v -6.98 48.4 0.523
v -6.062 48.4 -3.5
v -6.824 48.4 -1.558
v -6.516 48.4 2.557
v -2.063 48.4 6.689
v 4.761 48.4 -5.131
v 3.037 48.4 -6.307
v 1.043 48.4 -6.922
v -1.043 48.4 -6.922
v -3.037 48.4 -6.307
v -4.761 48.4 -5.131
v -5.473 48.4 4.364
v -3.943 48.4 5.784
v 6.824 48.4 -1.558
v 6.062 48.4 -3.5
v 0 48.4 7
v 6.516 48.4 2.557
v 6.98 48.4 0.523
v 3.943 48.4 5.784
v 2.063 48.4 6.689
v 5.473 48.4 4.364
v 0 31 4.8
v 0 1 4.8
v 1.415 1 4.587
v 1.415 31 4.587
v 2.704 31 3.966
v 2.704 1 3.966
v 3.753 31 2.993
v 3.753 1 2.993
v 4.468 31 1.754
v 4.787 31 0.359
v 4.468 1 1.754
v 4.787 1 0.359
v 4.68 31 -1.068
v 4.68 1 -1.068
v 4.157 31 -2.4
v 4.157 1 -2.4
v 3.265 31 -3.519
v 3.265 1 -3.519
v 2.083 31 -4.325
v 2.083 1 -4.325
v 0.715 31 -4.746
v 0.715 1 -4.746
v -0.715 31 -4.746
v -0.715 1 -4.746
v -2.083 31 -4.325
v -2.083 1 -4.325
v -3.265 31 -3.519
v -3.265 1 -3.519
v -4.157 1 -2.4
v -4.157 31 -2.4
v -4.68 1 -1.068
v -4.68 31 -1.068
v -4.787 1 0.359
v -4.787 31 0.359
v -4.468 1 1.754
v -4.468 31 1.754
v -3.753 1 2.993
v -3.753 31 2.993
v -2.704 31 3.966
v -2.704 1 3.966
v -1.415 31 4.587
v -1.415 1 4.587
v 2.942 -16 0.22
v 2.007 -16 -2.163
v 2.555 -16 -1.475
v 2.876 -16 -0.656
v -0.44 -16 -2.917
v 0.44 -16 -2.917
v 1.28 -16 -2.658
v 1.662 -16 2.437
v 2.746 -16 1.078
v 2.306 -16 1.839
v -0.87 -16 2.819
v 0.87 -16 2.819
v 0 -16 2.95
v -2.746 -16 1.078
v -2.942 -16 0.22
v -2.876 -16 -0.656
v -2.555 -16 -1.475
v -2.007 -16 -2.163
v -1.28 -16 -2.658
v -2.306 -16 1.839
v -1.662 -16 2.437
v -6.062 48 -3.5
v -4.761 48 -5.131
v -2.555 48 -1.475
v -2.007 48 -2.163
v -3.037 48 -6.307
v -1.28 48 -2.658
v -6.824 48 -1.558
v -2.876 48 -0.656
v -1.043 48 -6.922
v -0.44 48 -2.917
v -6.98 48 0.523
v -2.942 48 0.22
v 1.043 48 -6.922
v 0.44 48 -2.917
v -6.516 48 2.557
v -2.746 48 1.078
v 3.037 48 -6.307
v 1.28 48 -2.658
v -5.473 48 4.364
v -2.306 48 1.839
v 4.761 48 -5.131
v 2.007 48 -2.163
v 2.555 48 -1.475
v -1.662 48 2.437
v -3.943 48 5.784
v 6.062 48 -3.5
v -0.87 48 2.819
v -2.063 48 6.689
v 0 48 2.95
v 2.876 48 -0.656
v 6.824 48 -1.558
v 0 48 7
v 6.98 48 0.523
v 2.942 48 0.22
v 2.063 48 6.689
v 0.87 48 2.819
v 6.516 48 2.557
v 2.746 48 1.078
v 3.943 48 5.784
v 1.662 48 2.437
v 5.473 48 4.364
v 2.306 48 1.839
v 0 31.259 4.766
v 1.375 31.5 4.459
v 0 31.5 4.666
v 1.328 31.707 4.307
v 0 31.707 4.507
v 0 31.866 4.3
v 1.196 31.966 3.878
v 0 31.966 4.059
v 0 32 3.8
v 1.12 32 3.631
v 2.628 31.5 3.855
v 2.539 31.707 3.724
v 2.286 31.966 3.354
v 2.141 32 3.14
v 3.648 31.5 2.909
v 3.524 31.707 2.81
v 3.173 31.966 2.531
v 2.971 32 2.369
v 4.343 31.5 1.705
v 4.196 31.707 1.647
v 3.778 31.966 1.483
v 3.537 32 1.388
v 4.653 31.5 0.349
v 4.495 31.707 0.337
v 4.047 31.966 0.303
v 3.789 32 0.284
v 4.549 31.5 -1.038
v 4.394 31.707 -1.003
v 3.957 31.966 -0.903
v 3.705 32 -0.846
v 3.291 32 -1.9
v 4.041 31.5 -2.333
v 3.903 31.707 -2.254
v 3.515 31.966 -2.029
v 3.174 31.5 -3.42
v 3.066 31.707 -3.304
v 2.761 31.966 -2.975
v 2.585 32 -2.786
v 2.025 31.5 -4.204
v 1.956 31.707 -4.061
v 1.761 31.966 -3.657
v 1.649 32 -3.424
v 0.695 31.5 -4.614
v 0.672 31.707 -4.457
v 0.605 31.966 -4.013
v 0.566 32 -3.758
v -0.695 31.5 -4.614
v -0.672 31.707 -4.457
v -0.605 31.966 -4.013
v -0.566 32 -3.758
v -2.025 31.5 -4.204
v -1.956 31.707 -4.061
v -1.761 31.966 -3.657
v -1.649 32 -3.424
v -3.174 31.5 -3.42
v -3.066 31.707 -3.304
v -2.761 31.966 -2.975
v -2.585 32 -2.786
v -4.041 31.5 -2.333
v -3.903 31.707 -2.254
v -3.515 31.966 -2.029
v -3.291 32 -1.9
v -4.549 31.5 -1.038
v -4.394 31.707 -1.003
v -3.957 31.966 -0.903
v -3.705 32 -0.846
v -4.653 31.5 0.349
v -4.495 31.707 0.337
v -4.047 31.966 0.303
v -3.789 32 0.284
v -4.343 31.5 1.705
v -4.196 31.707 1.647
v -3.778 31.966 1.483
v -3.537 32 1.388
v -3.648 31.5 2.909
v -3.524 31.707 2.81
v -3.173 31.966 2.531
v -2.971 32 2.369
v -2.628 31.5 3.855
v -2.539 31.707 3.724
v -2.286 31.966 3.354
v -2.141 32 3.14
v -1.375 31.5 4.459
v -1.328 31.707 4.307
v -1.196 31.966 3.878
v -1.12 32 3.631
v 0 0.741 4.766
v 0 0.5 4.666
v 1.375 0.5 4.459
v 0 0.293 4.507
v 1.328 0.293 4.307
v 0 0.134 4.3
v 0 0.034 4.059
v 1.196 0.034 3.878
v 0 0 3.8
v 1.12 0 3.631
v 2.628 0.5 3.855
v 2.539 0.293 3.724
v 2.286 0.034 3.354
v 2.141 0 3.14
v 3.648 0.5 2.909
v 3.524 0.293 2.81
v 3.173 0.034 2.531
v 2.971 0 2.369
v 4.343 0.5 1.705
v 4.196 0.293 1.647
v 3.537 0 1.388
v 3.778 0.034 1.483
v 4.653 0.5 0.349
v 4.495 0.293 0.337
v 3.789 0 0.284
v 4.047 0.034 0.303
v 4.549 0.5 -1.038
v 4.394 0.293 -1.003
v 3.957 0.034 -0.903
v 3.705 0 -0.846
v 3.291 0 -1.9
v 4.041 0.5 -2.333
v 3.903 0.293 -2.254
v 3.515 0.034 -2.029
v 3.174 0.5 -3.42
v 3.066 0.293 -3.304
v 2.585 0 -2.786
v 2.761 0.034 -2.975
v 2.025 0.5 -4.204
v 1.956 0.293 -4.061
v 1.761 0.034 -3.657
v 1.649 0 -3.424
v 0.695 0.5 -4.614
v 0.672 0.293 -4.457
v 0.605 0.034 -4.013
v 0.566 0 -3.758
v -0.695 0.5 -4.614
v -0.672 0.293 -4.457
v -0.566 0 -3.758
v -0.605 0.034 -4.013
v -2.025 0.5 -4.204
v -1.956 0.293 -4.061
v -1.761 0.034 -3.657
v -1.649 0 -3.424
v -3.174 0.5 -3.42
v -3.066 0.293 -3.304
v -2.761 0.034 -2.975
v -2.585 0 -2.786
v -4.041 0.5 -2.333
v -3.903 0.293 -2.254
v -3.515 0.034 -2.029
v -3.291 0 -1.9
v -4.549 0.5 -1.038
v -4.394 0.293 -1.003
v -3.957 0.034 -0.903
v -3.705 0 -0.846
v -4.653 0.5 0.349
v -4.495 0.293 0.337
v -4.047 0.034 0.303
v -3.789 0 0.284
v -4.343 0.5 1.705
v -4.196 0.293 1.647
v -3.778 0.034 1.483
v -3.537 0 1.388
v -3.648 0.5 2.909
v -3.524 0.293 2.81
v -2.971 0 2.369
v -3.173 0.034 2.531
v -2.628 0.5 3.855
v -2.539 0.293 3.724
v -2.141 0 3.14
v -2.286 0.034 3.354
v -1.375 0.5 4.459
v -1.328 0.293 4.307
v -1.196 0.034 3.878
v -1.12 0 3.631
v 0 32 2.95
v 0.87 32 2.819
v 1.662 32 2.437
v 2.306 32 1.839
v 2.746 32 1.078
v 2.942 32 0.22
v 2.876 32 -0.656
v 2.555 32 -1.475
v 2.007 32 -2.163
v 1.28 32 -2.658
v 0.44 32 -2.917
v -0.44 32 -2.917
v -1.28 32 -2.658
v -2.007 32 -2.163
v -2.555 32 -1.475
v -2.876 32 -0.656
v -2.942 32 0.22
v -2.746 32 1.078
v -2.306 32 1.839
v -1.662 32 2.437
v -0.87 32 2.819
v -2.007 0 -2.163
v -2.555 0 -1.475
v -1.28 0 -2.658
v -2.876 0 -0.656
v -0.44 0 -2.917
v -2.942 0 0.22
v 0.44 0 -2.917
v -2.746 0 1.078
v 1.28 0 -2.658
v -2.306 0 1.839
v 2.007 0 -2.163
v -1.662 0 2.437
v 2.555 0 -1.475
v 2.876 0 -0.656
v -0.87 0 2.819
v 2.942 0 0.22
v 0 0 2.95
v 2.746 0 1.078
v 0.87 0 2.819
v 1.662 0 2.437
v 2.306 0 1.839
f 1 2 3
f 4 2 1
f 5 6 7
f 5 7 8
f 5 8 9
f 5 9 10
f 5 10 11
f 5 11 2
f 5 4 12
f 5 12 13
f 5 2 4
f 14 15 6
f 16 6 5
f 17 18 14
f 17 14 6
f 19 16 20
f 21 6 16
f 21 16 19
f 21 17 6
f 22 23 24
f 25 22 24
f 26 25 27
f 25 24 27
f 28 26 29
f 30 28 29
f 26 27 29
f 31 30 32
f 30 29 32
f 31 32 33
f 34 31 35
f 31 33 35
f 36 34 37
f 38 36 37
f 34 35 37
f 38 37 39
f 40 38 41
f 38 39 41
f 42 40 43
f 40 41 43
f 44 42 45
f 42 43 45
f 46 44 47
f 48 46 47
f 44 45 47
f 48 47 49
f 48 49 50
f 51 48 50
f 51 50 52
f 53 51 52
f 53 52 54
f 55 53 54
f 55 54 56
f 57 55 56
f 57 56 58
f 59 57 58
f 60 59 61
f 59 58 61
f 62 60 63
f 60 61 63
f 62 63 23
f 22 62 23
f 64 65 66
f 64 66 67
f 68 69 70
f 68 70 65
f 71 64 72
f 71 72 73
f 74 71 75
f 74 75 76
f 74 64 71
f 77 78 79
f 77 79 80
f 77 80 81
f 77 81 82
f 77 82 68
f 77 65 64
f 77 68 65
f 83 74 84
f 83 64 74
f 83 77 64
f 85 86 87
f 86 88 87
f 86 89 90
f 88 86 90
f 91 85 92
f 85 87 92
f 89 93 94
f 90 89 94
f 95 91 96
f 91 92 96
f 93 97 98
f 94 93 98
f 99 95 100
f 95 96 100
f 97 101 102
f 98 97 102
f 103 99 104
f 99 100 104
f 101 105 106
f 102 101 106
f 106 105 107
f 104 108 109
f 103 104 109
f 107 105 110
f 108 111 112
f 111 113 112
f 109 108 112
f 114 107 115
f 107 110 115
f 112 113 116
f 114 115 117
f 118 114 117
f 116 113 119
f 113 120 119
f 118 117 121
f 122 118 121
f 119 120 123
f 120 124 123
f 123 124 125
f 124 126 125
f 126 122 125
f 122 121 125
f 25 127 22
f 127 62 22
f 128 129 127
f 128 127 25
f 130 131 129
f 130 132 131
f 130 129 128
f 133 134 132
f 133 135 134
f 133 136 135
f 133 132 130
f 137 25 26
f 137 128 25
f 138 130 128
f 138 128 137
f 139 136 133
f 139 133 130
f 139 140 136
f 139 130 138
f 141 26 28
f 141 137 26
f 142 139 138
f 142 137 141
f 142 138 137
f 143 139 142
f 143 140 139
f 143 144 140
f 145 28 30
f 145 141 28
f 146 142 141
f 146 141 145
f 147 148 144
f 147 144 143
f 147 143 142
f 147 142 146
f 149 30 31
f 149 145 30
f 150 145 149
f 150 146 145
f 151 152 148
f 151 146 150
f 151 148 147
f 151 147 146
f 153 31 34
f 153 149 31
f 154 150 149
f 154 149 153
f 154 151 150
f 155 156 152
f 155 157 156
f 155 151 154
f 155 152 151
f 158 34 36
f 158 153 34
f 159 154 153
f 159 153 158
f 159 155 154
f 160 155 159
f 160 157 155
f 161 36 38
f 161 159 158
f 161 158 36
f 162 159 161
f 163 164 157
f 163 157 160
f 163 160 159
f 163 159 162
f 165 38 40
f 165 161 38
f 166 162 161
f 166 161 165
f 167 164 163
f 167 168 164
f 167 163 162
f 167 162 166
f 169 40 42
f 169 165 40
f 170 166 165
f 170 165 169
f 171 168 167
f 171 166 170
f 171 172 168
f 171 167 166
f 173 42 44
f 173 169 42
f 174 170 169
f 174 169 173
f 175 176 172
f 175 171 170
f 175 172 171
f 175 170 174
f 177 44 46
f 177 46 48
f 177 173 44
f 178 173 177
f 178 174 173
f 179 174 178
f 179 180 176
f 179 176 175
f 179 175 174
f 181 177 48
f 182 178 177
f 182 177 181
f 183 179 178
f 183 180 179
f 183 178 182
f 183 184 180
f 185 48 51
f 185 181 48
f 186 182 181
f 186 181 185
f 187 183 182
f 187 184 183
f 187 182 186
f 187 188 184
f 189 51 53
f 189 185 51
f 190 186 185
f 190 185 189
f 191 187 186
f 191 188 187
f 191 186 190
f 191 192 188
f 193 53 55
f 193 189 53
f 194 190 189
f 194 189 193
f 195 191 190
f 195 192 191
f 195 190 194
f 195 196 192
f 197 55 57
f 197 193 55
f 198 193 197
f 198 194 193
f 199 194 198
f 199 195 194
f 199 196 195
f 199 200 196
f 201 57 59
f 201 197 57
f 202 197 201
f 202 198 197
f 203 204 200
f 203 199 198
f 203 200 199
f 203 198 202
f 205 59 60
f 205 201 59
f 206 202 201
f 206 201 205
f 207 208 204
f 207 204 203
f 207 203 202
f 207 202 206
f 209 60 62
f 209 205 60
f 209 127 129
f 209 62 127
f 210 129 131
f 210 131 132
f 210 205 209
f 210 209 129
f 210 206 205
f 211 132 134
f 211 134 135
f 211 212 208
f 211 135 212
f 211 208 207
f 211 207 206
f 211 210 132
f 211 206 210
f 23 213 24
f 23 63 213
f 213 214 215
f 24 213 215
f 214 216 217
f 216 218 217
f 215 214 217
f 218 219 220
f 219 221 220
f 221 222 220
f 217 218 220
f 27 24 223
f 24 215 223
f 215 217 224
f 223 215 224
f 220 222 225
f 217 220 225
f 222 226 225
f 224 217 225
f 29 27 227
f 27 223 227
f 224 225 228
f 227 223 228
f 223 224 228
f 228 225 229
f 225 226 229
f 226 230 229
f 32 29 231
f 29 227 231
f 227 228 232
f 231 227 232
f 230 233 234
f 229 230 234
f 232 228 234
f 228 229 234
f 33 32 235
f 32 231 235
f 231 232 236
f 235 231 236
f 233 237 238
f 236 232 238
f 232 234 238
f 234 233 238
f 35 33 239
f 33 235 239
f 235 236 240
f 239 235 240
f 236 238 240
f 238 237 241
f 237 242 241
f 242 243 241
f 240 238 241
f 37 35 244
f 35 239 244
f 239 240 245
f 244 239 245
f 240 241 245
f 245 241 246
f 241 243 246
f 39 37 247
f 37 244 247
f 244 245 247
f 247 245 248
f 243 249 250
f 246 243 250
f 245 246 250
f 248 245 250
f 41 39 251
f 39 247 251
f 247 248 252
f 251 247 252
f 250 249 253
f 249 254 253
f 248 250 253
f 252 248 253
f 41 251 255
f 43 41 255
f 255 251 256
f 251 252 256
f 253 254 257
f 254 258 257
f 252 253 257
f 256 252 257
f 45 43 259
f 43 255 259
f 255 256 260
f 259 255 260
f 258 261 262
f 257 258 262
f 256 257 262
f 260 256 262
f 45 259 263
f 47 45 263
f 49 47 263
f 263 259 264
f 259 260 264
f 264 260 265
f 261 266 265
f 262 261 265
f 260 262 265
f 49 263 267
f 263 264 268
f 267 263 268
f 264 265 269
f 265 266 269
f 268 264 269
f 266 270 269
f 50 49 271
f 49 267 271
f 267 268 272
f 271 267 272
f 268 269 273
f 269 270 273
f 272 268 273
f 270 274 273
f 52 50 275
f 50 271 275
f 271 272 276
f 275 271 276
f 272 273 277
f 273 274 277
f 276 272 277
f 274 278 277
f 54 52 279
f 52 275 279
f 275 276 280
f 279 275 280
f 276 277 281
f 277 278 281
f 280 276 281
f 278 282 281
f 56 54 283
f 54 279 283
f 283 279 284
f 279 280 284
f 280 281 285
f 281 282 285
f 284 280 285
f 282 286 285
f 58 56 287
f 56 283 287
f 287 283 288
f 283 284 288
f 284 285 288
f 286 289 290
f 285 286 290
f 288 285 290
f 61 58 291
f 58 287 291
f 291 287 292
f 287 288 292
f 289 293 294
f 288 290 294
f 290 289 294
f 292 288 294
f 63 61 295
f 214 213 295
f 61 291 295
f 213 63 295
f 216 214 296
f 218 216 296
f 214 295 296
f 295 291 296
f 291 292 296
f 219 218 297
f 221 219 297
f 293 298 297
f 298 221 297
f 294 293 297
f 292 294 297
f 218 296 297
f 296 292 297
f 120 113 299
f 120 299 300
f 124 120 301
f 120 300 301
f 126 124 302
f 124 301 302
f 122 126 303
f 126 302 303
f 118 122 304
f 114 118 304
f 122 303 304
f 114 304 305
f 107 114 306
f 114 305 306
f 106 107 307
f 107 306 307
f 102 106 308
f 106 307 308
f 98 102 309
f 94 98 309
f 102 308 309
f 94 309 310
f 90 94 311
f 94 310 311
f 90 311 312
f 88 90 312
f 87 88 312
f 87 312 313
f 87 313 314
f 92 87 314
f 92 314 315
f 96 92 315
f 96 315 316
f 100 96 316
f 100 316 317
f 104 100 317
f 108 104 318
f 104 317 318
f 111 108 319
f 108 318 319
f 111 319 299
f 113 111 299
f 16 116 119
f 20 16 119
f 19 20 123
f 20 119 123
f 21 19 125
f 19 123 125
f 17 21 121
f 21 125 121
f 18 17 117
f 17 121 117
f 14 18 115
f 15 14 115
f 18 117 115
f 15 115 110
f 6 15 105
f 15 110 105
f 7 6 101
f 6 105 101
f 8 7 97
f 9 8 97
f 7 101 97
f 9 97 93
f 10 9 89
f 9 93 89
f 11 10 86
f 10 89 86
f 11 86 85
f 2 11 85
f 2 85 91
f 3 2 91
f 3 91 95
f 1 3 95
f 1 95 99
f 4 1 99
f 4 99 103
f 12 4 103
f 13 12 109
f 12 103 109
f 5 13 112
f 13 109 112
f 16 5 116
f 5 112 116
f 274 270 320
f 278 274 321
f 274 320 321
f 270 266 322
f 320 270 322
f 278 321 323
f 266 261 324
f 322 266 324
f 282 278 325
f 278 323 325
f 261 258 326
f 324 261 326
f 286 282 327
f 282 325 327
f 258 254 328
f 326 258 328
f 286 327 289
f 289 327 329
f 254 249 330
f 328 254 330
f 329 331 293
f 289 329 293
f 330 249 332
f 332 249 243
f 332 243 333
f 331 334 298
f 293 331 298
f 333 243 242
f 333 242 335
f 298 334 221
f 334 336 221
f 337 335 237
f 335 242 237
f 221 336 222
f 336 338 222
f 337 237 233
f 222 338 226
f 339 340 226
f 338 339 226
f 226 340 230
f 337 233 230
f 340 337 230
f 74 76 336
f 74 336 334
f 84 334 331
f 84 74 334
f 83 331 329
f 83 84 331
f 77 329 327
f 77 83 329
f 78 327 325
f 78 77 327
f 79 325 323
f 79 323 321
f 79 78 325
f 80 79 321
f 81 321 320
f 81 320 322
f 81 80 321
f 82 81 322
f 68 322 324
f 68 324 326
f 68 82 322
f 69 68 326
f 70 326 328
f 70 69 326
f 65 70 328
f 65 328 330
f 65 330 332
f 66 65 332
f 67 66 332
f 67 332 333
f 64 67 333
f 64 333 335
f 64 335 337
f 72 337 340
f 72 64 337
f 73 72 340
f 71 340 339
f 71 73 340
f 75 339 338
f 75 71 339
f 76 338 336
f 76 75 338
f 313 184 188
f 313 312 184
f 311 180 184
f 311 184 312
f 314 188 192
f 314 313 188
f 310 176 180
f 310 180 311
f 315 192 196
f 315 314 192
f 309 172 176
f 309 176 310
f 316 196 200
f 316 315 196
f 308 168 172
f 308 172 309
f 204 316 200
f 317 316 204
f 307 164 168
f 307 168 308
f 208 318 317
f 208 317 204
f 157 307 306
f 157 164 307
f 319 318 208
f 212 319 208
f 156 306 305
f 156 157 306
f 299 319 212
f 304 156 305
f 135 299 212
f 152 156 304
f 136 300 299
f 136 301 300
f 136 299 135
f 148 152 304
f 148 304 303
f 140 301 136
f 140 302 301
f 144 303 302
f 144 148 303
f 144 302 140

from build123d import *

# Parameters (mm, degrees)
SKETCH1_R           = 4.8
BOSS_EXTRUDE2_DEPTH = 32
SKETCH2_R           = 2.95
BOSS_EXTRUDE3_DEPTH = 16
BOSS_EXTRUDE4_START = 16
SKETCH3_R           = 2.95
BOSS_EXTRUDE4_DEPTH = 16
FILLET1_R           = 1
SKETCH4_R           = 7
BOSS_EXTRUDE5_DEPTH = 0.4


with BuildPart() as part:
    # Sketch1 → Boss-Extrude2 (new body)
    with BuildSketch(Plane(origin=(0, 0, 0), x_dir=(1, 0, 0), z_dir=(0, 1, 0))):
        with Locations(Location((0, 0, 0), (0, 0, 270))):
            Circle(SKETCH1_R)
    extrude(amount=BOSS_EXTRUDE2_DEPTH)

    # Sketch2 → Boss-Extrude3 (add)
    with BuildSketch(Plane(origin=(0, 32, 0), x_dir=(1, 0, 0), z_dir=(0, 1, 0))):
        with Locations(Location((0, 0, 0), (0, 0, 270))):
            Circle(SKETCH2_R)
    extrude(amount=BOSS_EXTRUDE3_DEPTH)

    # Sketch3 → Boss-Extrude4 (add)
    with BuildSketch(Plane.XZ.offset(BOSS_EXTRUDE4_START)):
        with Locations(Location((0, 0, 0), (0, 0, 90))):
            Circle(SKETCH3_R)
    extrude(amount=-BOSS_EXTRUDE4_DEPTH)

    # Fillet1
    fillet1_edges = [part.edges().sort_by_distance(p)[0] for p in [
        (0, 0, -4.8),
        (0, 32, -4.8),
    ]]
    fillet(fillet1_edges, radius=FILLET1_R)

    # Sketch4 → Boss-Extrude5 (add)
    with BuildSketch(Plane(origin=(0, 48, 0), x_dir=(1, 0, 0), z_dir=(0, 1, 0))):
        with Locations(Location((0, 0, 0), (0, 0, 270))):
            Circle(SKETCH4_R)
    extrude(amount=BOSS_EXTRUDE5_DEPTH)


solid = part.part
